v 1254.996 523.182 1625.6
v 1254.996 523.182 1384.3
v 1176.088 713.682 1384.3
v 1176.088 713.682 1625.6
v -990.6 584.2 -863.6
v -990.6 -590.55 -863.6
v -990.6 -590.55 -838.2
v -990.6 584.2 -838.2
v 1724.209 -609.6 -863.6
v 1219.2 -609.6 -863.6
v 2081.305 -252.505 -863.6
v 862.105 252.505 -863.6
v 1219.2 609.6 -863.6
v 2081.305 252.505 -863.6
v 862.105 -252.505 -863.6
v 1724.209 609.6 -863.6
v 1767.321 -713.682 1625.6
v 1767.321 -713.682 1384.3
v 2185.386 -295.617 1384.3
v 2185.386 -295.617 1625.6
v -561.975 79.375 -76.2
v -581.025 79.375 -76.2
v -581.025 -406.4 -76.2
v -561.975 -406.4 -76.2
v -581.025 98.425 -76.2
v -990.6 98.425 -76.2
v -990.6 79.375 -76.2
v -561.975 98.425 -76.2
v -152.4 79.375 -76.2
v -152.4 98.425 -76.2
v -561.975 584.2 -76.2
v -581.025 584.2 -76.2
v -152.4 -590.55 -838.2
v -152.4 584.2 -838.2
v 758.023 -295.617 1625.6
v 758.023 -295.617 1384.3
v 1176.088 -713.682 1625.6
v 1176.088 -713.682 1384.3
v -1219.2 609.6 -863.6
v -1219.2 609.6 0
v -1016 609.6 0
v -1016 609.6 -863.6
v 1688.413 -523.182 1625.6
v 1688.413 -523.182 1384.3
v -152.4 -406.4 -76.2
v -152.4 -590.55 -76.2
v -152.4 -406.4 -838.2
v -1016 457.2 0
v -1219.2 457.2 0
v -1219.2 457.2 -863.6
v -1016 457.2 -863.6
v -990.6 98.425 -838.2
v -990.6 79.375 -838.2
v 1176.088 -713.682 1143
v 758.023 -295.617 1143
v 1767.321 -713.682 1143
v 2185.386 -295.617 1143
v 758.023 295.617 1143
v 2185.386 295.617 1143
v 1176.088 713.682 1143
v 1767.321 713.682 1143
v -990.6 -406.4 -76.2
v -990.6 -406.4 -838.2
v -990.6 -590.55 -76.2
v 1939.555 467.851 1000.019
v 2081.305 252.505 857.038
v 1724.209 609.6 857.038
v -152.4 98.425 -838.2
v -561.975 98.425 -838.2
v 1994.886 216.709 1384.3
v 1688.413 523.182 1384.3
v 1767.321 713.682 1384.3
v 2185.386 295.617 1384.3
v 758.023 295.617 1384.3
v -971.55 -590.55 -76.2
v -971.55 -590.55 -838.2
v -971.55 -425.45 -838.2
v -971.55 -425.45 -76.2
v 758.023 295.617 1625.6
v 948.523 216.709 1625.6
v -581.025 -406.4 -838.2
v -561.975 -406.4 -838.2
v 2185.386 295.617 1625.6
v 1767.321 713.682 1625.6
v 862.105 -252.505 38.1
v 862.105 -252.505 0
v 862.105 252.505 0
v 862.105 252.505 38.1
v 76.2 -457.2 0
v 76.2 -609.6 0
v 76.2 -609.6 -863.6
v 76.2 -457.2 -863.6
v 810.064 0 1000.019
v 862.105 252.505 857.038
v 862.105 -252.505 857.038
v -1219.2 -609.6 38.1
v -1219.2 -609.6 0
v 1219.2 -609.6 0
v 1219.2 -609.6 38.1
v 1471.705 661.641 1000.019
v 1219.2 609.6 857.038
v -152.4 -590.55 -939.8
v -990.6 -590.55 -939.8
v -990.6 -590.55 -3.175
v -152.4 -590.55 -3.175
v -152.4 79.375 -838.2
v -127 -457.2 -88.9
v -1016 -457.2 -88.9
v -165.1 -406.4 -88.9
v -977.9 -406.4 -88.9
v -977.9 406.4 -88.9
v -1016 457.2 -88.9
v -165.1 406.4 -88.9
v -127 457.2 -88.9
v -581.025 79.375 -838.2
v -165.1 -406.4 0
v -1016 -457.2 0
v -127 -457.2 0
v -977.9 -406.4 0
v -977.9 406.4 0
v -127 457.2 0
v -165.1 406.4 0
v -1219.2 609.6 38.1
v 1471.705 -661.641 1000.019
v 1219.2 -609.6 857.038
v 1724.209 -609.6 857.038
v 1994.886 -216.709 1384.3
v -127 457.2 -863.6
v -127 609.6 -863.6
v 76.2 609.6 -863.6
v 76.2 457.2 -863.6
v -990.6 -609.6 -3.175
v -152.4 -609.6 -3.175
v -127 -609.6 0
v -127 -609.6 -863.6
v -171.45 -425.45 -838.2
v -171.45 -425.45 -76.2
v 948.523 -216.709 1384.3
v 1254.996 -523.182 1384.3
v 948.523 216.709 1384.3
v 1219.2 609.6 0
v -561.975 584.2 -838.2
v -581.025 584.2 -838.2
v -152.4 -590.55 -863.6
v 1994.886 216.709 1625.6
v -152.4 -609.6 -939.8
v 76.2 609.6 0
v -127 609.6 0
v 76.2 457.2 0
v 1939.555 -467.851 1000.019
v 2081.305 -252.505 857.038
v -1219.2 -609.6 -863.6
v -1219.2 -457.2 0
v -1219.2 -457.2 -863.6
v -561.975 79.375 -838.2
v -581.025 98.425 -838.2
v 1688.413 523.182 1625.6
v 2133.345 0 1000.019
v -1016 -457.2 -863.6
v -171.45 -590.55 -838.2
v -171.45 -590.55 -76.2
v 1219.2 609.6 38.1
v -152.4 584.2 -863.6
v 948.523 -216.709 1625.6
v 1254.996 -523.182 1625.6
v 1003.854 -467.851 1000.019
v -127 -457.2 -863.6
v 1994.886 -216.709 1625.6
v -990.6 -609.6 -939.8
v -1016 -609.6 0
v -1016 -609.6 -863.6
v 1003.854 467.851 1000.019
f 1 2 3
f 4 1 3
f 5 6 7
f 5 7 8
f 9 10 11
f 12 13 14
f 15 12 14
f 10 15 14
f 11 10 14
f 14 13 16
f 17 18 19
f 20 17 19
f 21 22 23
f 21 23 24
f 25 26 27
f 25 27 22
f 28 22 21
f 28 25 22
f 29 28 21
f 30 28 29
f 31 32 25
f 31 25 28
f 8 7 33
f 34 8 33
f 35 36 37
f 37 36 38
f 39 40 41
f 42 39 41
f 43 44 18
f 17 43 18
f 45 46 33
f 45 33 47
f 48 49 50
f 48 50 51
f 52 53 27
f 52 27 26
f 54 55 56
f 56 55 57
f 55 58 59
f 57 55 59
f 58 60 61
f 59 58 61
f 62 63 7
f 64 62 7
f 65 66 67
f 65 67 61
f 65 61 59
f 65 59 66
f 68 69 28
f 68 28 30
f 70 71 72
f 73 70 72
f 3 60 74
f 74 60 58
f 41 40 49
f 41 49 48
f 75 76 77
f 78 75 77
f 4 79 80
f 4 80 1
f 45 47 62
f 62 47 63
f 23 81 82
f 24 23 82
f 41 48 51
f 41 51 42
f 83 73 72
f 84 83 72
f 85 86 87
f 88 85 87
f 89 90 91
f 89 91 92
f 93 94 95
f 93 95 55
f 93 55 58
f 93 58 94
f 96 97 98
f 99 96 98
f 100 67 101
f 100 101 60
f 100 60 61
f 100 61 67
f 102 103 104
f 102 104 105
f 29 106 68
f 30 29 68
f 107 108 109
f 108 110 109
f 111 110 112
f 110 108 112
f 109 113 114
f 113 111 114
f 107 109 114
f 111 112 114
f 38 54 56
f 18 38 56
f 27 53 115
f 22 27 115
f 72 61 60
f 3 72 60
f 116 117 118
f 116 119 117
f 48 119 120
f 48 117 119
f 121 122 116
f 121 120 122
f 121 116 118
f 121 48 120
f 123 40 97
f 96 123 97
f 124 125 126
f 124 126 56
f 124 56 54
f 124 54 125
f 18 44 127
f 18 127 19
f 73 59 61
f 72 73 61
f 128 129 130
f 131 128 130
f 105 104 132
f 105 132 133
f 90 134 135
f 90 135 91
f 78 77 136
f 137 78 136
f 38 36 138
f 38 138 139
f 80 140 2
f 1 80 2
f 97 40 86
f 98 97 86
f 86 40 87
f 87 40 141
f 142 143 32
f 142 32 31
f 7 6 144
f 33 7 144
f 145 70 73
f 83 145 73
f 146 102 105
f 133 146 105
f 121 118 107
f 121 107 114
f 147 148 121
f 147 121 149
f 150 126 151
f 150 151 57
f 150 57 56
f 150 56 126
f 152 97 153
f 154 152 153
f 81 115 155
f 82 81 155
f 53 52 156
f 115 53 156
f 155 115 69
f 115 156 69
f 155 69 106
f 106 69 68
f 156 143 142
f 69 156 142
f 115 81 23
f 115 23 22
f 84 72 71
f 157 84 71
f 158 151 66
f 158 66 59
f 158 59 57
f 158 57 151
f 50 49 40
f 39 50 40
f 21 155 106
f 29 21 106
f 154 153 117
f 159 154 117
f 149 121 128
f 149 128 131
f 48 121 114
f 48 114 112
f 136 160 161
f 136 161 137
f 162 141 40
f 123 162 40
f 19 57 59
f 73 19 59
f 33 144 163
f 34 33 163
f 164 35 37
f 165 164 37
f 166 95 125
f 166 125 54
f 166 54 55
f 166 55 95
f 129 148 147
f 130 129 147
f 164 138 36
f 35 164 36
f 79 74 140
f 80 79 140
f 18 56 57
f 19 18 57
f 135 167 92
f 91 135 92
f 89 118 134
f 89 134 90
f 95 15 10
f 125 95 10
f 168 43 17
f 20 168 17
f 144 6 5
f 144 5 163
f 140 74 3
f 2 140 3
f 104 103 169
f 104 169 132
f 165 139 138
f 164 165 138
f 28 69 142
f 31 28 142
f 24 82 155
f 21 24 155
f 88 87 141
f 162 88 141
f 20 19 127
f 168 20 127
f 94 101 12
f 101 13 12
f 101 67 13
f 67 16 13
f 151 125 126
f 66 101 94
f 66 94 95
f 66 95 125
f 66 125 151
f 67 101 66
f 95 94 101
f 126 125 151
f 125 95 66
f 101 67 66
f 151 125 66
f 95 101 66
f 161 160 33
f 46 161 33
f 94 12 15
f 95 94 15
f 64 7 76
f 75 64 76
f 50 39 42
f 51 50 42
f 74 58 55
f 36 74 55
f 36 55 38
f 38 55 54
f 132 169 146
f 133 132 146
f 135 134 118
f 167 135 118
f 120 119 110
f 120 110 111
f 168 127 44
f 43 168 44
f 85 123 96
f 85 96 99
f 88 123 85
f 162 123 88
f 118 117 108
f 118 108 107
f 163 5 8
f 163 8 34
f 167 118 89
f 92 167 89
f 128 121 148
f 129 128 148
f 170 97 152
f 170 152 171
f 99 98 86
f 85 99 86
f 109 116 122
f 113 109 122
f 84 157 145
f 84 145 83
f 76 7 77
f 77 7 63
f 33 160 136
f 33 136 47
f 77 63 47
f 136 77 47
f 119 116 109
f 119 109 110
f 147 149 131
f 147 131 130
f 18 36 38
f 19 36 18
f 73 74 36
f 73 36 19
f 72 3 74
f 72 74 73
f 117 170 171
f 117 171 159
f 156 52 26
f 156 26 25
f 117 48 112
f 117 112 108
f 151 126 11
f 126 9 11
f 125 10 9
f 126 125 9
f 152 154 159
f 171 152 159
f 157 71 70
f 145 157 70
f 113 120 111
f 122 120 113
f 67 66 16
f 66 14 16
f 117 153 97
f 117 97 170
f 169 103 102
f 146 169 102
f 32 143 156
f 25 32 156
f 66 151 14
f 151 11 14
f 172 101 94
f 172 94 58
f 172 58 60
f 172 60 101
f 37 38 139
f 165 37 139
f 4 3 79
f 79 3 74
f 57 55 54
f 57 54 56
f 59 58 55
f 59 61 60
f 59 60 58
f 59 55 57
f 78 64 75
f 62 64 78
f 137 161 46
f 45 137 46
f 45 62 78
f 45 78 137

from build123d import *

# Parameters (mm, degrees)
F3_DEPTH      = 38.1
F4_W          = 203.2
F4_H          = 152.4
F5_DEPTH      = 863.6
F8_DEPTH      = 863.6
F8_DEPTH_BACK = 857.0384116704
F10_DEPTH     = 285.9615883296
F10_TAPER     = -20
F12_DEPTH     = 241.3
F14_DEPTH     = 241.3
F15_W         = 38.1
F15_H         = 812.8
F16_DEPTH     = 88.9
F18_W         = 838.2
F18_H         = 1174.75
F19_DEPTH     = 25.4
F21_W         = 838.2
F21_H         = 936.625
F22_DEPTH     = 19.05
F23_W         = 19.05
F23_H         = 165.1
F24_DEPTH     = 762
F25_W         = 19.05
F25_H         = 485.775
F25_H_2       = 19.05
F25_W_2       = 409.575
F26_DEPTH     = 762


with BuildPart() as f3:
    # F2 (on Top) → F3 (new body)
    with BuildSketch(Plane.XY):
        Polygon((-1219.2, 609.6), (-1219.2, -609.6), (1219.2, -609.6), (862.1045876226, -252.5045876226), (862.1045876226, 252.5045876226), (1219.2, 609.6), align=None)
    extrude(amount=F3_DEPTH)


with BuildPart() as f5:
    # F4 (on Top) → F5 (new body, through all)
    with BuildSketch(Plane.XY):
        with Locations((-1117.6, 533.4)):
            Rectangle(F4_W, F4_H)
    extrude(amount=-F5_DEPTH)


with BuildPart() as f5b:
    # F4 (on Top) → F5, piece 2 (new body, through all)
    with BuildSketch(Plane.XY):
        with Locations((-1117.6, -533.4)):
            Rectangle(F4_W, F4_H)
    extrude(amount=-F5_DEPTH)


with BuildPart() as f5c:
    # F4 (on Top) → F5, piece 3 (new body, through all)
    with BuildSketch(Plane.XY):
        with Locations((-25.4, 533.4)):
            Rectangle(F4_W, F4_H)
    extrude(amount=-F5_DEPTH)


with BuildPart() as f5d:
    # F4 (on Top) → F5, piece 4 (new body, through all)
    with BuildSketch(Plane.XY):
        with Locations((-25.4, -533.4)):
            Rectangle(F4_W, F4_H)
    extrude(amount=-F5_DEPTH)


with BuildPart() as f8:
    # F7 (on Top) → F8 (new body, two sides)
    with BuildSketch(Plane.XY) as f8_sk:
        Polygon((1219.2, -609.6), (1724.2091752453, -609.6), (2081.3045876226, -252.5045876226), (2081.3045876226, 252.5045876226), (1724.2091752453, 609.6), (1219.2, 609.6), (862.1045876226, 252.5045876226), (862.1045876226, -252.5045876226), align=None)
    extrude(amount=-F8_DEPTH)
    extrude(f8_sk.sketch, amount=F8_DEPTH_BACK)


with BuildPart() as f10:
    # F9 (on face) → F10 (new body, through all)
    with BuildSketch(Plane.XY.offset(857.0384116704)):
        Polygon((862.1045876226, 252.5045876226), (862.1045876226, -252.5045876226), (1219.2, -609.6), (1724.2091752453, -609.6), (2081.3045876226, -252.5045876226), (2081.3045876226, 252.5045876226), (1724.2091752453, 609.6), (1219.2, 609.6), align=None)
    extrude(amount=F10_DEPTH, taper=F10_TAPER)


with BuildPart() as f12:
    # F11 (on face) → F12 (new body, through all)
    with BuildSketch(Plane.XY.offset(1143)):
        Polygon((1767.3211467451, 713.6815062955), (1176.0880285002, 713.6815062955), (758.0230813272, 295.6165591224), (758.0230813272, -295.6165591224), (1176.0880285002, -713.6815062955), (1767.3211467451, -713.6815062955), (2185.3860939181, -295.6165591224), (2185.3860939181, 295.6165591224), align=None)
    extrude(amount=F12_DEPTH)


with BuildPart() as f14:
    # F13 (on face) → F14 (new body, through all)
    with BuildSketch(Plane.XY.offset(1384.3)):
        Polygon((1254.9957121323, 523.1815062955), (1176.0880285002, 713.6815062955), (758.0230813272, 295.6165591224), (948.5230813272, 216.7088754904), align=None)
    extrude(amount=F14_DEPTH)


with BuildPart() as f14b:
    # F13 (on face) → F14, piece 2 (new body, through all)
    with BuildSketch(Plane.XY.offset(1384.3)):
        Polygon((2185.3860939181, 295.6165591224), (1767.3211467451, 713.6815062955), (1688.413463113, 523.1815062955), (1994.8860939181, 216.7088754904), align=None)
    extrude(amount=F14_DEPTH)


with BuildPart() as f14c:
    # F13 (on face) → F14, piece 3 (new body, through all)
    with BuildSketch(Plane.XY.offset(1384.3)):
        Polygon((1767.3211467451, -713.6815062955), (2185.3860939181, -295.6165591224), (1994.8860939181, -216.7088754904), (1688.413463113, -523.1815062955), align=None)
    extrude(amount=F14_DEPTH)


with BuildPart() as f14d:
    # F13 (on face) → F14, piece 4 (new body, through all)
    with BuildSketch(Plane.XY.offset(1384.3)):
        Polygon((948.5230813272, -216.7088754904), (758.0230813272, -295.6165591224), (1176.0880285002, -713.6815062955), (1254.9957121323, -523.1815062955), align=None)
    extrude(amount=F14_DEPTH)


with BuildPart() as f16:
    # F15 (on Top) → F16 (new body)
    with BuildSketch(Plane.XY):
        with Locations((-146.05, 0)):
            Rectangle(F15_W, F15_H)
        Polygon((-977.9, -406.4), (-1016, -406.4), (-1016, -457.2), (-127, -457.2), (-127, -406.4), (-165.1, -406.4), align=None)
        with Locations((-996.95, 0)):
            Rectangle(F15_W, F15_H)
        Polygon((-127, 457.2), (-1016, 457.2), (-1016, 406.4), (-977.9, 406.4), (-165.1, 406.4), (-127, 406.4), align=None)
    extrude(amount=-F16_DEPTH)


with BuildPart() as f19:
    # F18 (on plane+point) → F19 (new body)
    with BuildSketch(Plane.XY.offset(-863.6)):
        with Locations((-571.5, -3.175)):
            Rectangle(F18_W, F18_H)
    extrude(amount=F19_DEPTH)


with BuildPart() as f22:
    # F21 (on plane+point) → F22 (new body, through all)
    with BuildSketch(Plane.XZ.offset(590.55)):
        with Locations((-571.5, -471.4875)):
            Rectangle(F21_W, F21_H)
    extrude(amount=F22_DEPTH)


with BuildPart() as f24:
    # F23 (on face) → F24 (new body)
    with BuildSketch(Plane.XY.offset(-838.2)):
        Polygon((-152.4, -406.4), (-990.6, -406.4), (-990.6, -425.45), (-971.55, -425.45), (-171.45, -425.45), (-152.4, -425.45), align=None)
        with Locations((-981.075, -508)):
            Rectangle(F23_W, F23_H)
        with Locations((-161.925, -508)):
            Rectangle(F23_W, F23_H)
    extrude(amount=F24_DEPTH)


with BuildPart() as f26:
    # F25 (on face) → F26 (new body)
    with BuildSketch(Plane.XY.offset(-838.2)):
        with Locations((-571.5, 341.3125)):
            Rectangle(F25_W, F25_H)
        with Locations((-571.5, 88.9)):
            Rectangle(F25_W, F25_H_2)
        with Locations((-785.8125, 88.9)):
            Rectangle(F25_W_2, F25_H_2)
        with Locations((-357.1875, 88.9)):
            Rectangle(F25_W_2, F25_H_2)
        with Locations((-571.5, -163.5125)):
            Rectangle(F25_W, F25_H)
    extrude(amount=F26_DEPTH)


solid = Compound([f3.part, f5.part, f5b.part, f5c.part, f5d.part, f8.part, f10.part, f12.part, f14.part, f14b.part, f14c.part, f14d.part, f16.part, f19.part, f22.part, f24.part, f26.part])
